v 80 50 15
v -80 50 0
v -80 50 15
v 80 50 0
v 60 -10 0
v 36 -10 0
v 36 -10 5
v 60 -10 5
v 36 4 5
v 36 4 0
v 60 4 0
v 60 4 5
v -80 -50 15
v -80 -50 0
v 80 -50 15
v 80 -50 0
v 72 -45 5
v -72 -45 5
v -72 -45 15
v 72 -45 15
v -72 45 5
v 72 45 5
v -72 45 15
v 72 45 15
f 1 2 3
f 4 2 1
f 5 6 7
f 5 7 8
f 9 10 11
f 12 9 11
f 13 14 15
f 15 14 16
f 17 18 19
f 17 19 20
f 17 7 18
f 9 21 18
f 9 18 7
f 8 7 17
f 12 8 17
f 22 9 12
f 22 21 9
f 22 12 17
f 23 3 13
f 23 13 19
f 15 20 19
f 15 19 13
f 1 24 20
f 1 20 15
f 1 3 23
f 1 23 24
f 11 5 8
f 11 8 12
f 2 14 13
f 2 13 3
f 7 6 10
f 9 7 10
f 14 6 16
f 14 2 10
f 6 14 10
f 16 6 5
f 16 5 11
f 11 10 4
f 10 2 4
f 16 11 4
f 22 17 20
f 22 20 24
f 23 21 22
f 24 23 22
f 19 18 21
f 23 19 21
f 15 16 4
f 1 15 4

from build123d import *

# Parameters (mm, degrees)
ESQUISSE1_W                = 160
ESQUISSE1_H                = 100
ESQUISSE1_W_2              = 144
ESQUISSE1_H_2              = 90
PROFONDEUR_COUVERCLE_DEPTH = 15
ESQUISSE2_W                = 144
ESQUISSE2_H                = 90
PROFONDEUR_FOND_DEPTH      = 5
ESQUISSE3_W                = 24
ESQUISSE3_H                = 14
ECRAN_HELTEC_DEPTH         = 21


with BuildPart() as part:
    # Esquisse1 → profondeur couvercle (new body)
    with BuildSketch(Plane.XY):
        Rectangle(ESQUISSE1_W, ESQUISSE1_H)
        Rectangle(ESQUISSE1_W_2, ESQUISSE1_H_2, mode=Mode.SUBTRACT)
    extrude(amount=PROFONDEUR_COUVERCLE_DEPTH)

    # Esquisse2 → profondeur fond (add)
    with BuildSketch(Plane.XY):
        Rectangle(ESQUISSE2_W, ESQUISSE2_H)
    extrude(amount=PROFONDEUR_FOND_DEPTH)

    # Esquisse3 → ecran heltec (cut)
    with BuildSketch(Plane.XY):
        with Locations((48, -3)):
            Rectangle(ESQUISSE3_W, ESQUISSE3_H)
    extrude(amount=ECRAN_HELTEC_DEPTH, mode=Mode.SUBTRACT)


solid = part.part
